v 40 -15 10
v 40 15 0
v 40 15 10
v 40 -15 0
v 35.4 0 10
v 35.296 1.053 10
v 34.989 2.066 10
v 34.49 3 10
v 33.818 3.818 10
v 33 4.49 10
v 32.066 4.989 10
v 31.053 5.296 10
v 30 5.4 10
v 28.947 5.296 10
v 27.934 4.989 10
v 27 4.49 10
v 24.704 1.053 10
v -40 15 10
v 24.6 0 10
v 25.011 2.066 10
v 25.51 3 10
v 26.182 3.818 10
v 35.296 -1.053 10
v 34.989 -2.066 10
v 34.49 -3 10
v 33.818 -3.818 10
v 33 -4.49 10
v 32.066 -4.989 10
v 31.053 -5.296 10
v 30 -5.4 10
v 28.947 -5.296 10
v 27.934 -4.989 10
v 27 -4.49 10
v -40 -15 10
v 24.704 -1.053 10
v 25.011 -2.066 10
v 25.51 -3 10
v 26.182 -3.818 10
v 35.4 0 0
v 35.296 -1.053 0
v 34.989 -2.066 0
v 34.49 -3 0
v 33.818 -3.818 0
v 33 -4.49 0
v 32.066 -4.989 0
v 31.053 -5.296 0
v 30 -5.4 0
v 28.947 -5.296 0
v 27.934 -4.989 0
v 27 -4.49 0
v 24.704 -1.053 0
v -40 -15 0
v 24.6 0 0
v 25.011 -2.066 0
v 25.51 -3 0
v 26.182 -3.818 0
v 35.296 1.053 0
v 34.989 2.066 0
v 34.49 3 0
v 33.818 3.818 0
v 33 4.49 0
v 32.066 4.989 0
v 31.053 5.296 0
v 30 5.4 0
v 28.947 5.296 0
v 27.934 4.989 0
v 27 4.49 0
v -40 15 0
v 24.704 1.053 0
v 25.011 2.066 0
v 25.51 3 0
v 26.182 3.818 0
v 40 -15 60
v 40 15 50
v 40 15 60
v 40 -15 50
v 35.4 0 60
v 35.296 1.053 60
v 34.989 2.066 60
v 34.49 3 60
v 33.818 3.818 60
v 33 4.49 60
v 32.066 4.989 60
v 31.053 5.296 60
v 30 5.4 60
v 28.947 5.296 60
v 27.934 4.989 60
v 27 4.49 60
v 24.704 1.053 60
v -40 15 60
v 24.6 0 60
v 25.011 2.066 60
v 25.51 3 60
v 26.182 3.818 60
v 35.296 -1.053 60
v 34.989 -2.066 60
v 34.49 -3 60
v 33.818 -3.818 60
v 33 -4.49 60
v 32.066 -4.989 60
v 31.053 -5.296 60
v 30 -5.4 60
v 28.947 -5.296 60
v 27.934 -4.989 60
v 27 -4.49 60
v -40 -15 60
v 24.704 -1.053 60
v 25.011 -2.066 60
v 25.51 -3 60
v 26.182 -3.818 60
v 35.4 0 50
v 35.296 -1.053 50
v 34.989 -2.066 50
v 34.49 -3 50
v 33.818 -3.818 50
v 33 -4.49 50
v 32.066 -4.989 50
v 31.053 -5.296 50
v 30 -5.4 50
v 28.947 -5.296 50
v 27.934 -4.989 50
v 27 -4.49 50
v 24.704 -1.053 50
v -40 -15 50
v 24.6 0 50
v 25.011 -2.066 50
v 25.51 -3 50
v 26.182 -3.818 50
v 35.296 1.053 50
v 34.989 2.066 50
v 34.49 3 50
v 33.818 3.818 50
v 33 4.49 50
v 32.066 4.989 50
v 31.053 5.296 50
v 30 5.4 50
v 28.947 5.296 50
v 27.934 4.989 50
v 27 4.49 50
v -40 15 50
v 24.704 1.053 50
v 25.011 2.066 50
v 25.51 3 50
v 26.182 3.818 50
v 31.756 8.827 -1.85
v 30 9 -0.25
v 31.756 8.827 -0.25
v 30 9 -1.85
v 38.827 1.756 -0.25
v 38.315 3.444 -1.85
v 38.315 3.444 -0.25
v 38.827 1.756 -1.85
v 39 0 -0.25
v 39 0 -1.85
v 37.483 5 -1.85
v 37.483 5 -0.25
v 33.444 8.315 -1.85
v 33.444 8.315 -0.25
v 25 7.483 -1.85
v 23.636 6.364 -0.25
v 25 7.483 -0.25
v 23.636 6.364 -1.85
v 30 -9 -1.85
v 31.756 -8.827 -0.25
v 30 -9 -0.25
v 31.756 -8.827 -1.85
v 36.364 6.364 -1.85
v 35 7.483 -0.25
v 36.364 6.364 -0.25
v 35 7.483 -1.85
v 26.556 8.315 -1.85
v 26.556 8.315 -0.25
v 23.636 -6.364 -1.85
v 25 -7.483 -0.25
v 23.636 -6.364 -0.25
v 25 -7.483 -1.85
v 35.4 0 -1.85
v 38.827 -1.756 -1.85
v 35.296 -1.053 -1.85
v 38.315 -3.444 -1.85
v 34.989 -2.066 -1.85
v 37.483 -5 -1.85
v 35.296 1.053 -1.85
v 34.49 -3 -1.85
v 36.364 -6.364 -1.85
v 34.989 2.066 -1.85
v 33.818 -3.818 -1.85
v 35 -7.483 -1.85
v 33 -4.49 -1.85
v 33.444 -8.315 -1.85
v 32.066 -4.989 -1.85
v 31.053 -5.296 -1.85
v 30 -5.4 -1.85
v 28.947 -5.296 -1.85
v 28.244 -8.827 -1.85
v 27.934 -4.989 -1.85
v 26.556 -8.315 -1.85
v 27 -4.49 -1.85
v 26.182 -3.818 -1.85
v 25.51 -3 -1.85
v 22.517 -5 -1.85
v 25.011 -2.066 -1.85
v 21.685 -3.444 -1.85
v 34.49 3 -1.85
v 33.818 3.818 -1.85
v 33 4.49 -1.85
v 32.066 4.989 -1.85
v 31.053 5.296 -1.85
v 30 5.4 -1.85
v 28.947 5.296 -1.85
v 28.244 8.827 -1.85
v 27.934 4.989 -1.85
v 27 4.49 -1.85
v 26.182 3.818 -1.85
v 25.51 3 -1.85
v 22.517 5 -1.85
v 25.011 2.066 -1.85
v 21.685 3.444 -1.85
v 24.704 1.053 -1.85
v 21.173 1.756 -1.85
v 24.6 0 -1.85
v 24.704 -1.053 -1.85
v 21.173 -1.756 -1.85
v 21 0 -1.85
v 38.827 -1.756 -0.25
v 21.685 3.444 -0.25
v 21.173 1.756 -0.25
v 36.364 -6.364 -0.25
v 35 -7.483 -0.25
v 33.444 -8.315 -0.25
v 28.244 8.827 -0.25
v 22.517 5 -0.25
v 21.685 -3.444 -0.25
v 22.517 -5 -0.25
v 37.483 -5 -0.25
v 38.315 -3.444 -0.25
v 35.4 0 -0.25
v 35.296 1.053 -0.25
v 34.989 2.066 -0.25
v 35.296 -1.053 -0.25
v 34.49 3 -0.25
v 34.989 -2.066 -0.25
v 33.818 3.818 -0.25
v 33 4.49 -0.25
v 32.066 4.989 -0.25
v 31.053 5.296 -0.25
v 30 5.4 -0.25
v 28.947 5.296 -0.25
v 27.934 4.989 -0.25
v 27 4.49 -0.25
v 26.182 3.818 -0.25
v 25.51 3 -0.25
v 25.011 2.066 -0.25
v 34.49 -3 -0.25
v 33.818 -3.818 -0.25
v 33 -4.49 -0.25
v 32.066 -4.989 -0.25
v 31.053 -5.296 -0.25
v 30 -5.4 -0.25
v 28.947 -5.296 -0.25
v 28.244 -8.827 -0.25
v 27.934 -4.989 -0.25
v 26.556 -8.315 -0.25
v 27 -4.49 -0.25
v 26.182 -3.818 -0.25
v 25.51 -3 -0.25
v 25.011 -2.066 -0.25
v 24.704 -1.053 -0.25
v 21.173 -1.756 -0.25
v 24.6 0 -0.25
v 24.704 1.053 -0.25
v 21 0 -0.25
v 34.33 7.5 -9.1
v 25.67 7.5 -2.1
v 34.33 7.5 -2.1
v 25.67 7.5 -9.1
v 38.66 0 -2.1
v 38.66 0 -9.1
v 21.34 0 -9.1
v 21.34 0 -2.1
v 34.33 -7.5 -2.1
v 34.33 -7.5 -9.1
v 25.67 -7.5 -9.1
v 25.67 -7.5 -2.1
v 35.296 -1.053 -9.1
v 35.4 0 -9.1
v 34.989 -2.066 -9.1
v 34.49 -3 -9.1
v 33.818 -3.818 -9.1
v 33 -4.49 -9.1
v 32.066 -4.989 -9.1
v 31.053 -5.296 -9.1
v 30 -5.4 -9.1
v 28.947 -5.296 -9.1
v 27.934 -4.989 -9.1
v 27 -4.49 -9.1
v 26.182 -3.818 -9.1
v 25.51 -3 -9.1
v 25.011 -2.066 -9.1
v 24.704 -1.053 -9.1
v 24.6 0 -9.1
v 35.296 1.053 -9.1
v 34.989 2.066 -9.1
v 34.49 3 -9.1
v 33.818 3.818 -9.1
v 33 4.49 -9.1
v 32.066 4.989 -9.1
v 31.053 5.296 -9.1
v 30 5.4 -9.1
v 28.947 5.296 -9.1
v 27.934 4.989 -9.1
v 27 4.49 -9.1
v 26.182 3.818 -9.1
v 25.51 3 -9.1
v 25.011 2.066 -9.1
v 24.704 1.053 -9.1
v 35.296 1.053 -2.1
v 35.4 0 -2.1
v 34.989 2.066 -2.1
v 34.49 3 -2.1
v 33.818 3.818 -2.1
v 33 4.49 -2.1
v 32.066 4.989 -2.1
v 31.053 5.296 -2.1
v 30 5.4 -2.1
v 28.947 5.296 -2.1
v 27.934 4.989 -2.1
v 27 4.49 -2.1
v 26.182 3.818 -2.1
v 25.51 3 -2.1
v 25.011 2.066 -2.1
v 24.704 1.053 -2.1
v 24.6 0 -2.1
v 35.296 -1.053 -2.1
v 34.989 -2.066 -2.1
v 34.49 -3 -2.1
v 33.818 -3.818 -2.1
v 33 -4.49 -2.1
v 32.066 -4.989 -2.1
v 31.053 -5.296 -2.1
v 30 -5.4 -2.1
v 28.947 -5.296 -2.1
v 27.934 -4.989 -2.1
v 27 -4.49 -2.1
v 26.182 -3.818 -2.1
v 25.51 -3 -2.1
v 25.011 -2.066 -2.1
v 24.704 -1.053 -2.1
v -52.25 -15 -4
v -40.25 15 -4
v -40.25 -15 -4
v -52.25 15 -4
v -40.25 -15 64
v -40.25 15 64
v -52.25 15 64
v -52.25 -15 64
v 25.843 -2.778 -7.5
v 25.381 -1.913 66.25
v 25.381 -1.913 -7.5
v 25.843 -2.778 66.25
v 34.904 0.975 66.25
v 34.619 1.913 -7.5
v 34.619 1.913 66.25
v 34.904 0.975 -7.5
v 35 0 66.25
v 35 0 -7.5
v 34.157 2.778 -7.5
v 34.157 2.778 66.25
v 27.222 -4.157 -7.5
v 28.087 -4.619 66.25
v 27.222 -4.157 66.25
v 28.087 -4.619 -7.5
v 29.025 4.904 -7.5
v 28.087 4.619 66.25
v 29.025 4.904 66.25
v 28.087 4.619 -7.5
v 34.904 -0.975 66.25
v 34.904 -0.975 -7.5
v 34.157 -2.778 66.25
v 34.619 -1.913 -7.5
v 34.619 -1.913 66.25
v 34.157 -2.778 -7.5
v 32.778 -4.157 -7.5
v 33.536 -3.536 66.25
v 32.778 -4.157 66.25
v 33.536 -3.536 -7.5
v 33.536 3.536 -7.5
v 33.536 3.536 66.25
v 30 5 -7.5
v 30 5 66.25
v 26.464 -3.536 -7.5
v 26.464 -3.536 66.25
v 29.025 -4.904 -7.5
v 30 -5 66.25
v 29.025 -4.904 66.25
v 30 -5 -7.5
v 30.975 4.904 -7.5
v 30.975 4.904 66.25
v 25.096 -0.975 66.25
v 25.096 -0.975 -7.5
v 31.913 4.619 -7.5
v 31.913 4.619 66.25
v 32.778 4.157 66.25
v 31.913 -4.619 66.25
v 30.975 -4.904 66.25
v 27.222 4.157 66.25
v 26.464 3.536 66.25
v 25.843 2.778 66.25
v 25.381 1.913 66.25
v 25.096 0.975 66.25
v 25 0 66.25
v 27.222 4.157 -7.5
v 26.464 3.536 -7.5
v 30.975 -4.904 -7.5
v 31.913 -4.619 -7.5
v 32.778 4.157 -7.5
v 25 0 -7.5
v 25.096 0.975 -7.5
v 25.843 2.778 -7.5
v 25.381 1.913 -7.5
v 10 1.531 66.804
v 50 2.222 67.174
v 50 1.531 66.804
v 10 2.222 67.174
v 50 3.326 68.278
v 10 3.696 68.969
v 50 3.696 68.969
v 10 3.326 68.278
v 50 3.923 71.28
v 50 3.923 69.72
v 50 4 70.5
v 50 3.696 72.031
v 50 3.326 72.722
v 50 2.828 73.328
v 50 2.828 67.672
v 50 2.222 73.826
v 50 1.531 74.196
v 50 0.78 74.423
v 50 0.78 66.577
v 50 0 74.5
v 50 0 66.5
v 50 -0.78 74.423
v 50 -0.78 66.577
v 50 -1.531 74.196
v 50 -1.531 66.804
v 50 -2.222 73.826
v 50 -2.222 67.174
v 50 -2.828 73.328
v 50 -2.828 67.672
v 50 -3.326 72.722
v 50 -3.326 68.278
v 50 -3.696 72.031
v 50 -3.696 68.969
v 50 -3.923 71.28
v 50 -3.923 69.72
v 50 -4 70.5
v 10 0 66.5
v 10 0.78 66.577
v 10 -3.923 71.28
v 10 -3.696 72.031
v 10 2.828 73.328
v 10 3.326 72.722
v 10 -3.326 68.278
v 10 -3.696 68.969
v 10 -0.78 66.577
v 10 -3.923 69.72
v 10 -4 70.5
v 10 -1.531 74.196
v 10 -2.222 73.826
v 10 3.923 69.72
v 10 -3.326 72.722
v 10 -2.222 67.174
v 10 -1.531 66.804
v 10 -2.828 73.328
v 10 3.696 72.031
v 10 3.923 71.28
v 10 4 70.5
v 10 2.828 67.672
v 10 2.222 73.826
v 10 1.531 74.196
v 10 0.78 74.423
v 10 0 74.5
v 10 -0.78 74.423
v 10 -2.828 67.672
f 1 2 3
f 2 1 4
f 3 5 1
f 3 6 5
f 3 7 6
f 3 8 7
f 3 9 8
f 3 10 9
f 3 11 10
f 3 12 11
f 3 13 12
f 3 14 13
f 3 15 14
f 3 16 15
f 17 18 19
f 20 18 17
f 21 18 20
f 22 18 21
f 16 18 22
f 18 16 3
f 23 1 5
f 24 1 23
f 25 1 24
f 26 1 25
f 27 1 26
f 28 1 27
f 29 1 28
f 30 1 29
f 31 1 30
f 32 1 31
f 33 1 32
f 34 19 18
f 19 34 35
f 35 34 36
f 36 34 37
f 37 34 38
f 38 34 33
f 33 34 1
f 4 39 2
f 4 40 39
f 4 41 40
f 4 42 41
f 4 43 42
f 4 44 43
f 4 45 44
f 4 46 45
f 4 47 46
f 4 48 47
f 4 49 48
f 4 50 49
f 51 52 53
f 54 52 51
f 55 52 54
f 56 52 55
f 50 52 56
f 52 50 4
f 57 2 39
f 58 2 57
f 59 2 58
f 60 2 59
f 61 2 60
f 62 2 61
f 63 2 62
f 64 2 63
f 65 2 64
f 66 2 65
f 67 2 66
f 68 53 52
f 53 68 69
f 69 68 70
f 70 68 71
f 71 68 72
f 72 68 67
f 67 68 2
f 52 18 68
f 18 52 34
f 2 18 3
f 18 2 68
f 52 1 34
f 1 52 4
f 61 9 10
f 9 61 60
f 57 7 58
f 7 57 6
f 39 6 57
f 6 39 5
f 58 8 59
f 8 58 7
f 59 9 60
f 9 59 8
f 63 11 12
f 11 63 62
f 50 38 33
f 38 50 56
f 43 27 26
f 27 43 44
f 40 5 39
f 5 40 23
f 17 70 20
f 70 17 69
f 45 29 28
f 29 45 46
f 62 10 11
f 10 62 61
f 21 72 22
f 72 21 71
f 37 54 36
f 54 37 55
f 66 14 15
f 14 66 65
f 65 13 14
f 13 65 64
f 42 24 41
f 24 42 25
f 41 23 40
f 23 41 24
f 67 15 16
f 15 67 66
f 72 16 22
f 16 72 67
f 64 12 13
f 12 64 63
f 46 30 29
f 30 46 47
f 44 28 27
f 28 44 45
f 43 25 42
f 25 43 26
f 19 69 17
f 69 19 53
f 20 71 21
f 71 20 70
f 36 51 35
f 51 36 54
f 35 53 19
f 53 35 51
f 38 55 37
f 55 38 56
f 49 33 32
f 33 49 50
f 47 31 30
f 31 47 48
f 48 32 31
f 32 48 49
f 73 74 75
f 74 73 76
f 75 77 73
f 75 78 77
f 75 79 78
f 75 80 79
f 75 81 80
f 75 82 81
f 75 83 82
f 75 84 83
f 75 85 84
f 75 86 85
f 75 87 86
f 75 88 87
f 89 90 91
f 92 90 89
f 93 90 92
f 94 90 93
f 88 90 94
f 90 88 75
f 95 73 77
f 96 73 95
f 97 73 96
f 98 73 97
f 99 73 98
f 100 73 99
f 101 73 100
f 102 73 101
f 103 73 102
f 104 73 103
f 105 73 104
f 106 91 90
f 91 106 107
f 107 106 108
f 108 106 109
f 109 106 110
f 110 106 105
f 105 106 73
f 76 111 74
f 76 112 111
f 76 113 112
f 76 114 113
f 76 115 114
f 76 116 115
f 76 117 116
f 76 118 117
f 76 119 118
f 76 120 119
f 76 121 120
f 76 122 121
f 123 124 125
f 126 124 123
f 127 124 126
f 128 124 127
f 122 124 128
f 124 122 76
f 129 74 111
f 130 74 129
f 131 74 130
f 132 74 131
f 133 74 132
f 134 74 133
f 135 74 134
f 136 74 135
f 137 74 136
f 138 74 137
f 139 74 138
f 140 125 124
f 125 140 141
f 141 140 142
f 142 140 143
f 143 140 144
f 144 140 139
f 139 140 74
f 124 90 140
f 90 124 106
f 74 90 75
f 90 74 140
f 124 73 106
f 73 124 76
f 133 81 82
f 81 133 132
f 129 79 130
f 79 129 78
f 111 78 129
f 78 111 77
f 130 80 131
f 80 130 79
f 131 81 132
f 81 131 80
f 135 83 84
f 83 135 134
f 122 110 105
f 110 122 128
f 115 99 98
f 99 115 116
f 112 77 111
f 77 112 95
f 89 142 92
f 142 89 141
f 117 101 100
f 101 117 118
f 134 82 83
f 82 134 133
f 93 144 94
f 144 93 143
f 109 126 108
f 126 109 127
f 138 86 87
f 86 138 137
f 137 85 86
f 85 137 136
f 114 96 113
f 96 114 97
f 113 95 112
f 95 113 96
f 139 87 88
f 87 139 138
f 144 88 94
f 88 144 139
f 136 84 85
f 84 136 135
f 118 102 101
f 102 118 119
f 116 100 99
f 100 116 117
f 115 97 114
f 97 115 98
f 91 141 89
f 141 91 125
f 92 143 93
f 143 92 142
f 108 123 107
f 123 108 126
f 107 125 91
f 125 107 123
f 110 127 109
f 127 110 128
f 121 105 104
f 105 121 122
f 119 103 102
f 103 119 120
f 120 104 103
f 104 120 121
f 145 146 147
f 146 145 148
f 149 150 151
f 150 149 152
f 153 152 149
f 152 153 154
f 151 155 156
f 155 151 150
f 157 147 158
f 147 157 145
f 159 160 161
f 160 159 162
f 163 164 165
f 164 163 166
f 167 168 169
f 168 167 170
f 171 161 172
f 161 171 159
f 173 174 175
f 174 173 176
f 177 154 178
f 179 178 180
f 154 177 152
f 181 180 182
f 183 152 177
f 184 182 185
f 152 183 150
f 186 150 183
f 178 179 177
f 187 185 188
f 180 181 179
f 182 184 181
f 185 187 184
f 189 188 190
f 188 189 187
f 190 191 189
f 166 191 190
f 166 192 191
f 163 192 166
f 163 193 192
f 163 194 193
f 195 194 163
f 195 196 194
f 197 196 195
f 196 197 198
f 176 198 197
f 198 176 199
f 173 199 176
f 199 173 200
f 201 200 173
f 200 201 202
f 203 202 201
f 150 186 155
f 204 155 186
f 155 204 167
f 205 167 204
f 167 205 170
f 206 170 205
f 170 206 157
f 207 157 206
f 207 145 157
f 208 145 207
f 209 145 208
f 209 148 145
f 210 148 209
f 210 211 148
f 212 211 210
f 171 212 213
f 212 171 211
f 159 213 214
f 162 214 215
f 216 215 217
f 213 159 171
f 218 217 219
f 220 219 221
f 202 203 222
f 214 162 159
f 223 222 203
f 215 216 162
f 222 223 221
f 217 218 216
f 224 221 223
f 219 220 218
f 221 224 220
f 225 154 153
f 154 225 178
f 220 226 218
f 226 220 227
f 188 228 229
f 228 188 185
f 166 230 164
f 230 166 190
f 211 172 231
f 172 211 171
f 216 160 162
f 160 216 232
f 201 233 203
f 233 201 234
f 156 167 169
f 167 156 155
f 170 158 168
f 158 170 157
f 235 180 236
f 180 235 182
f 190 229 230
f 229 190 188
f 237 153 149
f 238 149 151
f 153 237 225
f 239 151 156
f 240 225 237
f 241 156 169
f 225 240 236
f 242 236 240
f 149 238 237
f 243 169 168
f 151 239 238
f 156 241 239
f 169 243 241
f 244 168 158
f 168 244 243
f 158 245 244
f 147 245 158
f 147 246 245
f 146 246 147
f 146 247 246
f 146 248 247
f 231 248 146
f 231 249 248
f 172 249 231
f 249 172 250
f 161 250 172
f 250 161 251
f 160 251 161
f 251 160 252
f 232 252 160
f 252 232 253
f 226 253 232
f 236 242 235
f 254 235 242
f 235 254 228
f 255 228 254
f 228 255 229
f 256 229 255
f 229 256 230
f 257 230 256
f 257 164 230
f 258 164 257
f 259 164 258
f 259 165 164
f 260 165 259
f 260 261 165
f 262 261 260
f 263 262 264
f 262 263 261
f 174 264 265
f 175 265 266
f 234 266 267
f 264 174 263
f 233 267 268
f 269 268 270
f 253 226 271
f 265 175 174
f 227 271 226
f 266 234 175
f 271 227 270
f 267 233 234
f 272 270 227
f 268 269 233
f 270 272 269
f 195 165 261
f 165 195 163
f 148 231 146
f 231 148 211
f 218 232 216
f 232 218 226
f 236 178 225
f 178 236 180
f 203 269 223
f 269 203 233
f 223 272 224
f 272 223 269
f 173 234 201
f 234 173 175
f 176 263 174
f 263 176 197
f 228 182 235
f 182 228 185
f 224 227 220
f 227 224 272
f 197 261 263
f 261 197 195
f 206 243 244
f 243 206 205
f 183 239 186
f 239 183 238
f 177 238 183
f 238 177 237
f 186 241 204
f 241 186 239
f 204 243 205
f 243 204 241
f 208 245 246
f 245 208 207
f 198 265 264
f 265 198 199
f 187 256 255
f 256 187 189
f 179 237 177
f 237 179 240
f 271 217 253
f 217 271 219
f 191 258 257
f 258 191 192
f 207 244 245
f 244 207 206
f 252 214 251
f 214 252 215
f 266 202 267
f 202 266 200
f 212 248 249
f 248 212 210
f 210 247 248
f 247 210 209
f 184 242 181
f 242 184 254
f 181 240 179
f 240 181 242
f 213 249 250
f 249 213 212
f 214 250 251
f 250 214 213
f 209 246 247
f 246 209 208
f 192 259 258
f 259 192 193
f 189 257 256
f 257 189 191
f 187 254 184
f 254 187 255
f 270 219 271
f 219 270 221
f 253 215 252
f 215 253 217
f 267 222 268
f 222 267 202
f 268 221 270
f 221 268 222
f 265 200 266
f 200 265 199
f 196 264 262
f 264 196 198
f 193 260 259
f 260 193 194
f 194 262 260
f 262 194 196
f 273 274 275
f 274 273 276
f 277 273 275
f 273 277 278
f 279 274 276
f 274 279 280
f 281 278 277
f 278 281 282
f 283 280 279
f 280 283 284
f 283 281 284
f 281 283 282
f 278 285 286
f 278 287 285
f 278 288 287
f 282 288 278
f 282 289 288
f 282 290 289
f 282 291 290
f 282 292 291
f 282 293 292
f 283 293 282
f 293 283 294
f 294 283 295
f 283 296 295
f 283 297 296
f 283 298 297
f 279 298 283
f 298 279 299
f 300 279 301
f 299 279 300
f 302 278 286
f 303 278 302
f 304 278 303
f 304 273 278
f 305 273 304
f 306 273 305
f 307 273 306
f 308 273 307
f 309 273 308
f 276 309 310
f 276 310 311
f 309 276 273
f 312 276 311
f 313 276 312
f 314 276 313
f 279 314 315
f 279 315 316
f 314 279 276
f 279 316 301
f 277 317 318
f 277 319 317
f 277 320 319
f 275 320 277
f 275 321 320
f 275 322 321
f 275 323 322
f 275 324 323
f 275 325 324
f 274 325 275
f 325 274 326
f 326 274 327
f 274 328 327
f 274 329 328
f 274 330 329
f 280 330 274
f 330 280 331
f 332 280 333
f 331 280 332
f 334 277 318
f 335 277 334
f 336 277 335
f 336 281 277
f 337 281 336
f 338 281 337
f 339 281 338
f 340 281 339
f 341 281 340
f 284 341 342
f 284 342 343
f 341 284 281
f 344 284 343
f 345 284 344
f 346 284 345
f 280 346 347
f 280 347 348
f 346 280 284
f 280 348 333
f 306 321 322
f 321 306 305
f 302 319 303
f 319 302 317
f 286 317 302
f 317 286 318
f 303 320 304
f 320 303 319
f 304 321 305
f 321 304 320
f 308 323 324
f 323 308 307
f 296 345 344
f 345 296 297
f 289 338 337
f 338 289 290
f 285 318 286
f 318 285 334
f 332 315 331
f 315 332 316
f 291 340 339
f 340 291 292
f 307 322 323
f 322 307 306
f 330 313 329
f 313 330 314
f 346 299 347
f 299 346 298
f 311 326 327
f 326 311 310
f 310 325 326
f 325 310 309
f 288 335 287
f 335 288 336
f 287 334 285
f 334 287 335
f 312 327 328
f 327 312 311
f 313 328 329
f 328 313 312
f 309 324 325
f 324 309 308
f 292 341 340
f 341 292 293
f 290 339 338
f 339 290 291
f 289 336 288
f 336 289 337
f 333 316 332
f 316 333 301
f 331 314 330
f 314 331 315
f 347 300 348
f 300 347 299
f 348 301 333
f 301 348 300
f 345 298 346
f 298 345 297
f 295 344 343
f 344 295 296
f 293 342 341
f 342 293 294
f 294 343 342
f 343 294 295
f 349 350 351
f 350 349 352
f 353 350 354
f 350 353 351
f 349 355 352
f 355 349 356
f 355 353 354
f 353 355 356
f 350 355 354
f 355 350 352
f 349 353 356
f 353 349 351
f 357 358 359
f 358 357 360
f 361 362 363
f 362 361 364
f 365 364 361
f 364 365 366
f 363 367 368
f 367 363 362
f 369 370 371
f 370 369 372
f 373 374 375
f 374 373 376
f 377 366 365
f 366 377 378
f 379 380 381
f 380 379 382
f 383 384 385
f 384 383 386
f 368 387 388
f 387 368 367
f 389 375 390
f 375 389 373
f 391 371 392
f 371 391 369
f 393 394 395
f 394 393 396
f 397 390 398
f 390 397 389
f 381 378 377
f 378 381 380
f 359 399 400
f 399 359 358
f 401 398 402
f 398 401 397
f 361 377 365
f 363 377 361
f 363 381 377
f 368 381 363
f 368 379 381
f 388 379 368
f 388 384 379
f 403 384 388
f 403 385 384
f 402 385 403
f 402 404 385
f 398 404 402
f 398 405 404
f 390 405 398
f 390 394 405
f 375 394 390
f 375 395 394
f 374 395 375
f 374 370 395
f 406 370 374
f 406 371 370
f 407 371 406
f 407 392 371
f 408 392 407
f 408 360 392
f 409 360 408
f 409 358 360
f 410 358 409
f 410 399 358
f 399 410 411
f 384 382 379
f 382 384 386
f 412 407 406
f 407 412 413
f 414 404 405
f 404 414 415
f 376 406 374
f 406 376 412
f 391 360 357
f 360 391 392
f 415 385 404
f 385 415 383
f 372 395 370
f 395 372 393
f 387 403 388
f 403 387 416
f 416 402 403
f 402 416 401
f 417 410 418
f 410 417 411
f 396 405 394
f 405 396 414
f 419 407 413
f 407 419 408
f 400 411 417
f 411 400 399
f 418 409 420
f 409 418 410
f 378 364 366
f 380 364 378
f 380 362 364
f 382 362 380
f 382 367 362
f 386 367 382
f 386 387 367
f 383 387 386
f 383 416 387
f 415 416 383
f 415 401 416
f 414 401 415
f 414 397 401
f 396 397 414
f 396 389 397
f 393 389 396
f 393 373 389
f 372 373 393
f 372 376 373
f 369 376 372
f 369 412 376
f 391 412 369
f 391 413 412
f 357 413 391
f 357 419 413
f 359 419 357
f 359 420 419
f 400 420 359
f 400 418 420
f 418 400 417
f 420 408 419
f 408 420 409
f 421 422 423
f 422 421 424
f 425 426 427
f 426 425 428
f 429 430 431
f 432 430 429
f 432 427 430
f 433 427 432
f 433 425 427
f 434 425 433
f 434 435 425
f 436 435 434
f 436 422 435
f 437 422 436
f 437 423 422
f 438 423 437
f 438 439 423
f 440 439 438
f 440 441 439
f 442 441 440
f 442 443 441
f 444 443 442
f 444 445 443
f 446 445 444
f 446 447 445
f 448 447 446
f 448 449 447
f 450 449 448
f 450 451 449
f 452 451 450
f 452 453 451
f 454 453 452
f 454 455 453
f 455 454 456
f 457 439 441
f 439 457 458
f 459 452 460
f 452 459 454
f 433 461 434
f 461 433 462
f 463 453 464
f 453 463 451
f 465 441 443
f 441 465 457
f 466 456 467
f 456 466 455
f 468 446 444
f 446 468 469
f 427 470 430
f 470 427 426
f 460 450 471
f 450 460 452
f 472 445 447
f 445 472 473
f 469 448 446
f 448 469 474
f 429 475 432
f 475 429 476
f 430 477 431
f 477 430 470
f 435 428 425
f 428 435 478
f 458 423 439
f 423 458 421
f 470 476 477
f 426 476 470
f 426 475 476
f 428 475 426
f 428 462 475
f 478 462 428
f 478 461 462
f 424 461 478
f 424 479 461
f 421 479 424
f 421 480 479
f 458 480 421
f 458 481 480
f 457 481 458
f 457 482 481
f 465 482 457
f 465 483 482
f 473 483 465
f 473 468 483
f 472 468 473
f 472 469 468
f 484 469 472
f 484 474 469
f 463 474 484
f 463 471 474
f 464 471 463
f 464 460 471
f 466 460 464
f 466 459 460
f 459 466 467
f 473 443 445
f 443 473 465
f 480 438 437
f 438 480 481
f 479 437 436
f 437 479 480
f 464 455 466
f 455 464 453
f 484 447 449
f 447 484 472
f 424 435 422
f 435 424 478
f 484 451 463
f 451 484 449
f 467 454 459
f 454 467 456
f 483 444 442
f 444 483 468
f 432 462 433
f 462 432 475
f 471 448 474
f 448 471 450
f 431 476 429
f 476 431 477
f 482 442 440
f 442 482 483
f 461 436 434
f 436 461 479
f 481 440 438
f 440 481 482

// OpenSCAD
$fn = 32;

// ------------------------------------------------------------------------
// C clamp: throat 50 mm, screw d10
// Every part is its own module, assembly() places every instance.
// ------------------------------------------------------------------------

// --- part 1 ---
module clamp_arm() {
  difference() {
    translate([-40, -15, 0]) cube([80, 30, 10]);
    translate([30, 0, -1]) cylinder(h = 12, d = 10.8);
  }
}

// --- part 2 ---
module clamp_spine() {
  difference() {
    translate([-34, -15, 0]) cube([68, 30, 12]);
  }
}

// --- part 3 ---
module clamp_screw() {
  translate([0, 0, -36.875]) cylinder(h = 73.75, d = 10);
}

// --- part 4 ---
module clamp_washer() {
  difference() {
      translate([0, 0, 0]) cylinder(h = 1.6, d = 18);
      translate([0, 0, -1]) cylinder(h = 3.6, d = 10.8);
    }
}

// --- part 5 ---
module clamp_nut() {
  difference() {
    linear_extrude(height = 7) polygon(points = [[8.66, 0], [4.33, 7.5], [-4.33, 7.5], [-8.66, 0], [-4.33, -7.5], [4.33, -7.5]]);
    translate([0, 0, -1]) cylinder(h = 9, d = 10.8);
  }
}

// --- part 6 ---
module tommy_bar() {
  translate([0, 0, -20]) cylinder(h = 40, d = 8);
}

// --- assembly ---
module assembly() {
  color([0.80, 0.24, 0.20]) translate([0, 0, 0]) rotate([0, 0, 0]) clamp_arm();
  color([0.20, 0.45, 0.75]) translate([0, 0, 50]) rotate([0, 0, 0]) clamp_arm();
  color([0.25, 0.62, 0.32]) translate([-52.25, 0, 30]) rotate([0, 90, 0]) clamp_spine();
  color([0.92, 0.70, 0.18]) translate([30, 0, 29.375]) rotate([0, 0, 0]) clamp_screw();
  color([0.58, 0.35, 0.70]) translate([30, 0, -1.85]) rotate([0, 0, 0]) clamp_washer();
  color([0.16, 0.66, 0.66]) translate([30, 0, -9.1]) rotate([0, 0, 0]) clamp_nut();
  color([0.85, 0.48, 0.18]) translate([30, 0, 70.5]) rotate([0, 90, 0]) tommy_bar();
}

assembly();
